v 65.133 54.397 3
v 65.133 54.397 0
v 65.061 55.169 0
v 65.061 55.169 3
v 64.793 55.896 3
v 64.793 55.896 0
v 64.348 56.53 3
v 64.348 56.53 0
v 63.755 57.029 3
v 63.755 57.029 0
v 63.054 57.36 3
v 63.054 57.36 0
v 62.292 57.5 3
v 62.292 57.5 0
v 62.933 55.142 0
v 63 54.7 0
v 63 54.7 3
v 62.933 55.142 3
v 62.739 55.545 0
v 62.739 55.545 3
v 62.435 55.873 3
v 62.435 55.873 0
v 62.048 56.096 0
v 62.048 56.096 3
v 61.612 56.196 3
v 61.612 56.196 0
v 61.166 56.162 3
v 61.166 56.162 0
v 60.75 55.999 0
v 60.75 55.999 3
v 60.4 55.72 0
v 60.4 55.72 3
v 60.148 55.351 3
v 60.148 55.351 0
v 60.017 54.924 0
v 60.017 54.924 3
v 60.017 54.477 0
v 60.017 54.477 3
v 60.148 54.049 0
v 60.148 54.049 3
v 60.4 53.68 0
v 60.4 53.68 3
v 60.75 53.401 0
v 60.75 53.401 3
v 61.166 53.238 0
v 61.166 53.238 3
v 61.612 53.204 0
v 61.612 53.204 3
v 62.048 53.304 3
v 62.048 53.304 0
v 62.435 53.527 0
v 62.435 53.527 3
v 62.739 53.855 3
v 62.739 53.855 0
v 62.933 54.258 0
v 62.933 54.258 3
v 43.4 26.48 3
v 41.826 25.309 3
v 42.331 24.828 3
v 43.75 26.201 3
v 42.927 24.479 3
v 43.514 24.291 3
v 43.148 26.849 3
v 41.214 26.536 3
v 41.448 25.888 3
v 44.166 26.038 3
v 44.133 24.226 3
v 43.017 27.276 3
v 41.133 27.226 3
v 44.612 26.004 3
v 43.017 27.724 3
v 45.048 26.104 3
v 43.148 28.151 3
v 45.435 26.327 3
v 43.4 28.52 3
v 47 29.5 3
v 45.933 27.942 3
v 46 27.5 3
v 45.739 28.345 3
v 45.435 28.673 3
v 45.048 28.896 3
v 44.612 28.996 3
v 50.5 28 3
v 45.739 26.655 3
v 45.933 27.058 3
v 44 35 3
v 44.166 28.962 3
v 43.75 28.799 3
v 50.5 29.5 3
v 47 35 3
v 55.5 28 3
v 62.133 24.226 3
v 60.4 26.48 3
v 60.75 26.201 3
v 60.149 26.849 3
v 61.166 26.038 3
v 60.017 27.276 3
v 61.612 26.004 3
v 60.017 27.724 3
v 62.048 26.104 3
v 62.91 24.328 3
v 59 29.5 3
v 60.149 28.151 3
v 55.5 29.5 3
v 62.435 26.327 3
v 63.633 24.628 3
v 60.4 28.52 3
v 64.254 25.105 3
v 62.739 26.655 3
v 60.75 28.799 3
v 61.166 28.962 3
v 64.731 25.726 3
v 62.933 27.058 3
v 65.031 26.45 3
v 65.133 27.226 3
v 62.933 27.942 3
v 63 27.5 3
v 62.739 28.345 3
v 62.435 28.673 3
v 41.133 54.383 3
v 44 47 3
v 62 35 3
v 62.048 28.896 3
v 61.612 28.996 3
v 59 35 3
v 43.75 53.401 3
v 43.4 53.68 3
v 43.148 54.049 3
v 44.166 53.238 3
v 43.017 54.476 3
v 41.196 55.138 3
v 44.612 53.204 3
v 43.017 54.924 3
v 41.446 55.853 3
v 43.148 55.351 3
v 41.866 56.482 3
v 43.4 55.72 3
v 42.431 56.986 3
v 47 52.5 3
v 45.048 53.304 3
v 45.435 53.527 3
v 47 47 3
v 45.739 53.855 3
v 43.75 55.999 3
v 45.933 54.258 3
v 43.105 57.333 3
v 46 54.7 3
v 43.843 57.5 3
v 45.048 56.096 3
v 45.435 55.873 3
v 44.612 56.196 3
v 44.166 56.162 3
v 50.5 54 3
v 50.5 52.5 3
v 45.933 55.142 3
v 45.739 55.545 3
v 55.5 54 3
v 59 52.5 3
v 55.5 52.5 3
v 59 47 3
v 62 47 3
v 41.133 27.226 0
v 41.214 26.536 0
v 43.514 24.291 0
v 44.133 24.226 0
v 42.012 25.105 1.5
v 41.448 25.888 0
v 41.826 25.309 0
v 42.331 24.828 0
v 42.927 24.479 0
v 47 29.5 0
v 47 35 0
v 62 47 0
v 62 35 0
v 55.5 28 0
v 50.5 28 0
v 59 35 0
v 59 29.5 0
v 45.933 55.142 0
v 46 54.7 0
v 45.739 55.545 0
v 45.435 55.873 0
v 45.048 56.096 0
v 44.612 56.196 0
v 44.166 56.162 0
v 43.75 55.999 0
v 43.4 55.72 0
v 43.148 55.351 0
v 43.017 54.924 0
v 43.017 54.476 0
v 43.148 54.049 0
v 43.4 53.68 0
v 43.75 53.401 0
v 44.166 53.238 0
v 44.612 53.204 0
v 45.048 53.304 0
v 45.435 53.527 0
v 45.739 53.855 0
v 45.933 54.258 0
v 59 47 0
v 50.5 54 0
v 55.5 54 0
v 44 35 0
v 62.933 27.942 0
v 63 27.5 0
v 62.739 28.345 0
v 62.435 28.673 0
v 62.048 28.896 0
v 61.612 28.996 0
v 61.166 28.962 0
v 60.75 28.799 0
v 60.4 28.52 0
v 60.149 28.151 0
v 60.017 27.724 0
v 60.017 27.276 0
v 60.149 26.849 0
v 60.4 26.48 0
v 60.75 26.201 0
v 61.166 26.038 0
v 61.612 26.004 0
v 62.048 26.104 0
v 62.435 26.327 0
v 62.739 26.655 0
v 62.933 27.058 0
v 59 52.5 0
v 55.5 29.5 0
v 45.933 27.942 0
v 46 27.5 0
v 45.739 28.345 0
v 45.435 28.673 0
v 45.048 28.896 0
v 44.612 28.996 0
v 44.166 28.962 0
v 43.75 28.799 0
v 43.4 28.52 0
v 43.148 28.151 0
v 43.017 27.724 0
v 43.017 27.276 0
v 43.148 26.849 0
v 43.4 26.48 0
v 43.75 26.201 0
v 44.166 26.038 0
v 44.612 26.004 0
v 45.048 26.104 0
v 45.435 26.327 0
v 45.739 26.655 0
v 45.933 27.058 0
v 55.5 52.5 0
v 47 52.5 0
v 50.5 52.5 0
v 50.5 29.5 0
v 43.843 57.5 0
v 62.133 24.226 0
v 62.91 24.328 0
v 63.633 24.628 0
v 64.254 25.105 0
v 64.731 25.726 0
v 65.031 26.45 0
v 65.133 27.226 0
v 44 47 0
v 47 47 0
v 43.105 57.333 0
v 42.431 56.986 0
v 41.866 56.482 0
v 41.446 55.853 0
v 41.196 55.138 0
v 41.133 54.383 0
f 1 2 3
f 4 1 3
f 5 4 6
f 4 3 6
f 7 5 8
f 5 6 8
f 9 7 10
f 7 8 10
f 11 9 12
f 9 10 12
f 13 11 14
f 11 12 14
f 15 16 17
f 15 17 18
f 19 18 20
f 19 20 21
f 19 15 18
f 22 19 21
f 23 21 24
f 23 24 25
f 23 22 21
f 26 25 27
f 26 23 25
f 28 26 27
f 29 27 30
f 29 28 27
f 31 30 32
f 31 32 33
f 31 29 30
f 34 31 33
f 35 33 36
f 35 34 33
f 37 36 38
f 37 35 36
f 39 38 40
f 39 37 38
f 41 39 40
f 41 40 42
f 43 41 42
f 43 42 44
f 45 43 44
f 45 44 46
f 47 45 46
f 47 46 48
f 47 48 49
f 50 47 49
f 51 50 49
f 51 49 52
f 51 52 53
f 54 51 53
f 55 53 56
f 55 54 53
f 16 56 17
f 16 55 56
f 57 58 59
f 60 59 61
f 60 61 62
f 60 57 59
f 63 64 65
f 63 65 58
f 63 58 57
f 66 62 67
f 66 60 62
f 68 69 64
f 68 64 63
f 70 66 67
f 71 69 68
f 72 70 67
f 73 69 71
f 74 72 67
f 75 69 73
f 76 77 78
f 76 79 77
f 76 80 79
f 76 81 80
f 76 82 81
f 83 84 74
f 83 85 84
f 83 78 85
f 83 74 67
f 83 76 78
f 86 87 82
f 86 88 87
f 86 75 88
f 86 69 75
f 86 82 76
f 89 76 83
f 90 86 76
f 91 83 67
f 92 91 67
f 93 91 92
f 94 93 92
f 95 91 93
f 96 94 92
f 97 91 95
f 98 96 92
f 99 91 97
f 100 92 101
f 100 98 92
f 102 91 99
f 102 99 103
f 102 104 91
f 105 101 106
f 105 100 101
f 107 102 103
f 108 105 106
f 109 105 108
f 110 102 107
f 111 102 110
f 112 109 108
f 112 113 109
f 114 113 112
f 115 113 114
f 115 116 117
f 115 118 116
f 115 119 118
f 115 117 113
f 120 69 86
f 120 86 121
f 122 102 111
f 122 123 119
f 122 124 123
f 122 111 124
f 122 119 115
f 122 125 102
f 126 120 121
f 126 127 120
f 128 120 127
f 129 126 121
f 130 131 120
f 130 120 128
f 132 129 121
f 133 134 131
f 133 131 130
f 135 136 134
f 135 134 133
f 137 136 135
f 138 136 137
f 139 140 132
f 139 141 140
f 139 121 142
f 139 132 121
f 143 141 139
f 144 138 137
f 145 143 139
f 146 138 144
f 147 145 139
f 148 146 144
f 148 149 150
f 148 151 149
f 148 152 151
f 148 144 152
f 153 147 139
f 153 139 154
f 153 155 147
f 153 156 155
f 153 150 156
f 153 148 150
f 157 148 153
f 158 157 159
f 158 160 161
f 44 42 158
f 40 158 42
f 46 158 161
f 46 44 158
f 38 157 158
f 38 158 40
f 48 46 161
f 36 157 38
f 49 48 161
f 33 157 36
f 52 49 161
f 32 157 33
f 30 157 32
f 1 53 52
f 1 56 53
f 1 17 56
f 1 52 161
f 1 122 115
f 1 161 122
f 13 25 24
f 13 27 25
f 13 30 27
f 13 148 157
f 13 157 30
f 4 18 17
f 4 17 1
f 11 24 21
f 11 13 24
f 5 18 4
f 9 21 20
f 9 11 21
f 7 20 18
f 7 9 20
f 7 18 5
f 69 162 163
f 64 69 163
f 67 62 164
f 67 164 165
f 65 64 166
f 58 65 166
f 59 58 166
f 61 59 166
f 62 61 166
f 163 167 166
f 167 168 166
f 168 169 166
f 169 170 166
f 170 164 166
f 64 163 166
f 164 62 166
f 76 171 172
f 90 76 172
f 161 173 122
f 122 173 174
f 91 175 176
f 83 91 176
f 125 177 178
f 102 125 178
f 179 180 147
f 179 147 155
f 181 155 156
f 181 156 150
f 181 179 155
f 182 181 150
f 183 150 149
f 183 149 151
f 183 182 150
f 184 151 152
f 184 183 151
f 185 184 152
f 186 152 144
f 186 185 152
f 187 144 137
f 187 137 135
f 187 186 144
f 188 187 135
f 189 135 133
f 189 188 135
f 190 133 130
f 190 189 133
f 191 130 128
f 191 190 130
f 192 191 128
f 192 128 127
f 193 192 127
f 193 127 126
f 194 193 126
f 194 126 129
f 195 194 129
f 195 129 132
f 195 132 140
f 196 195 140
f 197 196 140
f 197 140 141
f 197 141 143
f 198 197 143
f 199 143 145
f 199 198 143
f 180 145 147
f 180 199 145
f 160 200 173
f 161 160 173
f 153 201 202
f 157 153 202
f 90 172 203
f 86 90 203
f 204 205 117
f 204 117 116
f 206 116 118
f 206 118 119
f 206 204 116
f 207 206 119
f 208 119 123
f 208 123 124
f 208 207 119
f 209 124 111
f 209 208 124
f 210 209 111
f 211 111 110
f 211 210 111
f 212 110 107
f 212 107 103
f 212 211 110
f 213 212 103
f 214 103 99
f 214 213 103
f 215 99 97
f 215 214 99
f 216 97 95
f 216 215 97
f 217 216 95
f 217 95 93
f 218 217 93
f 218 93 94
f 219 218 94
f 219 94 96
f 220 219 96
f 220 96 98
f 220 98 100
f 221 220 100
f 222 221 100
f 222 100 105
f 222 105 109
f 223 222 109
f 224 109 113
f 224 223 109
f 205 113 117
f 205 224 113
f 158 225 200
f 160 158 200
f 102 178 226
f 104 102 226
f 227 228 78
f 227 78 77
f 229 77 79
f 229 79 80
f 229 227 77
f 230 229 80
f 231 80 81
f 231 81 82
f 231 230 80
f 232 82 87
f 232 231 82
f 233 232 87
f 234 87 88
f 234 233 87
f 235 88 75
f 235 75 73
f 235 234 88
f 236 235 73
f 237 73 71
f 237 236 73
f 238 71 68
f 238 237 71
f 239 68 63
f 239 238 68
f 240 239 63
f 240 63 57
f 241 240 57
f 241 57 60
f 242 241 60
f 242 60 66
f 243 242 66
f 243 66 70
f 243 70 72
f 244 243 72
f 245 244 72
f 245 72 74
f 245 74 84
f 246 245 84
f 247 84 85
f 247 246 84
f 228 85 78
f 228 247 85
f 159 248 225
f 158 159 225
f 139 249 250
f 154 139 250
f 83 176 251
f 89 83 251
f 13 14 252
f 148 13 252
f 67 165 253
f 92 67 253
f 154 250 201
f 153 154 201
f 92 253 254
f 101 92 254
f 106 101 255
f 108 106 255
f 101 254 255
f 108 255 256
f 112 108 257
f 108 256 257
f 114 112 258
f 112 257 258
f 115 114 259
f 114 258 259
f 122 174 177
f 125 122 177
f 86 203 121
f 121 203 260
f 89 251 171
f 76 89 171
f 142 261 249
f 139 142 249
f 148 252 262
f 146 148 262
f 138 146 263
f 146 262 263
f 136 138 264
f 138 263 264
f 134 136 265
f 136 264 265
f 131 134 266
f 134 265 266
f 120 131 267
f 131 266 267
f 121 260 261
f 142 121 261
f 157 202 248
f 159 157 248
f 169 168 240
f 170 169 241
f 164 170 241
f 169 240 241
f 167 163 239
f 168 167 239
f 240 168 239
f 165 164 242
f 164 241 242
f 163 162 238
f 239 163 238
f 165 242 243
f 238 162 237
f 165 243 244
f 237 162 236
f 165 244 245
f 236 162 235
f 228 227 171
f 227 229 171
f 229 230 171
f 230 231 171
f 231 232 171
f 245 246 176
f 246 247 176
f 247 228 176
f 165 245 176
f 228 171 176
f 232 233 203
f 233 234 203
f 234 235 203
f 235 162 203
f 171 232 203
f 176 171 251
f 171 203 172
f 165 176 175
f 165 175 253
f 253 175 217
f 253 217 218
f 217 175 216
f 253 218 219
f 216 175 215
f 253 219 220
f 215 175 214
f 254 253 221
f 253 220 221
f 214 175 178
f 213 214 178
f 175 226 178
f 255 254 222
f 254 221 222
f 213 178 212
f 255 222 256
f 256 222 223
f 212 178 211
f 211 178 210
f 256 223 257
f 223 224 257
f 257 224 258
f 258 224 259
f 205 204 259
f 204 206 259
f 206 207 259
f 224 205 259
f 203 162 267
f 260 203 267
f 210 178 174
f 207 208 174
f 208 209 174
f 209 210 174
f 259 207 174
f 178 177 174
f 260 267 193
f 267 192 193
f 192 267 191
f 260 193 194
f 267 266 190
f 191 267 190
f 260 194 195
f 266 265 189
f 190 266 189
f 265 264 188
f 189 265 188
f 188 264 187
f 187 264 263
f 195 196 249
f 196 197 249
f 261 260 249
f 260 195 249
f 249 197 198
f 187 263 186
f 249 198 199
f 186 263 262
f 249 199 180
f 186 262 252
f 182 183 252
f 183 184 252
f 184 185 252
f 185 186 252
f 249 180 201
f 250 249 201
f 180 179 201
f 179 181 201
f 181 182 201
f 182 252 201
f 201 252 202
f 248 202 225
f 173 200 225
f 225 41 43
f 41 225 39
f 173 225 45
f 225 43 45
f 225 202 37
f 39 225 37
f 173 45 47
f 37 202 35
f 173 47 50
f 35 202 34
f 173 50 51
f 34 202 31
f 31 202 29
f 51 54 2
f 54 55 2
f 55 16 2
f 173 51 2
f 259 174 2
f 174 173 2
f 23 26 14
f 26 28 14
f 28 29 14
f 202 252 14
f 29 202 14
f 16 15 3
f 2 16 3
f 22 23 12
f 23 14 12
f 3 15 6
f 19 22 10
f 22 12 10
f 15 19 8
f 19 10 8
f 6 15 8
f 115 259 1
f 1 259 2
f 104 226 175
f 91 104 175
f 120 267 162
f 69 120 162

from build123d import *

# Parameters (mm, degrees)
MODEL_R             = 1.500000008
MODEL_R_2           = 1.499950004
MODEL_R_3           = 1.500050014
MODEL_R_4           = 1.500000002
BOSS_EXTRUDE1_DEPTH = 3


with BuildPart() as part:
    # Model → Boss-Extrude1 (new body)
    with BuildSketch(Plane.XY):
        with BuildLine():
            Line((41.133407433, 54.383216824), (41.133407433, 44.212078484))
            Line((41.133407433, 44.212078484), (41.133407433, 27.226016824))
            add(Edge.make_bspline(
                [(41.133407433, 27.226016824), (41.133407433, 26.430416824), (41.449407433, 25.667416824), (42.012007433, 25.104816824)],
                knots=[0, 0, 0, 0, 0.333333333, 0.333333333, 0.333333333, 0.333333333], degree=3))
            add(Edge.make_bspline(
                [(42.012007433, 25.104816824), (42.574607433, 24.542216824), (43.337707433, 24.226016824), (44.133407433, 24.226016824)],
                knots=[0.333333333, 0.333333333, 0.333333333, 0.333333333, 1, 1, 1, 1], degree=3))
            Line((44.133407433, 24.226016824), (62.133207433, 24.226016824))
            ThreePointArc((62.133207433, 24.226016824), (64.254457434, 25.104766823), (65.133207433, 27.226016824))
            Line((65.133207433, 27.226016824), (65.133207433, 44.226016824))
            Line((65.133207433, 44.226016824), (65.133207433, 54.397160398))
            ThreePointArc((65.133207433, 54.397160398), (64.34779637, 56.530036555), (62.292266716, 57.5))
            Line((62.292266716, 57.5), (59.346369656, 57.5))
            Line((59.346369656, 57.5), (47.346484736, 57.5))
            Line((47.346484736, 57.5), (43.843018497, 57.5))
            ThreePointArc((43.843018497, 57.5), (41.866482804, 56.482116631), (41.133407433, 54.383216824))
        make_face()
        with Locations((44.499899992, 27.500000005)):
            Circle(MODEL_R, mode=Mode.SUBTRACT)
        with Locations((61.499949997, 27.500049997)):
            Circle(MODEL_R_2, mode=Mode.SUBTRACT)
        Polygon((50.4999, 52.5), (50.4999, 54), (55.4999, 54), (55.4999, 52.5), (58.9999, 52.5), (58.9999, 47), (61.9999, 47), (61.9999, 35), (58.9999, 35), (58.9999, 29.5), (55.4999, 29.5), (55.4999, 28.0001), (50.4999, 28.0001), (50.4999, 29.5), (46.9999, 29.5), (46.9999, 35), (44.0001, 35), (44.0001, 47), (46.9999, 47), (46.9999, 52.5), align=None, mode=Mode.SUBTRACT)
        with Locations((44.499849987, 54.700050007)):
            Circle(MODEL_R_3, mode=Mode.SUBTRACT)
        with Locations((61.499900002, 54.700099998)):
            Circle(MODEL_R_4, mode=Mode.SUBTRACT)
    extrude(amount=BOSS_EXTRUDE1_DEPTH)


solid = part.part
